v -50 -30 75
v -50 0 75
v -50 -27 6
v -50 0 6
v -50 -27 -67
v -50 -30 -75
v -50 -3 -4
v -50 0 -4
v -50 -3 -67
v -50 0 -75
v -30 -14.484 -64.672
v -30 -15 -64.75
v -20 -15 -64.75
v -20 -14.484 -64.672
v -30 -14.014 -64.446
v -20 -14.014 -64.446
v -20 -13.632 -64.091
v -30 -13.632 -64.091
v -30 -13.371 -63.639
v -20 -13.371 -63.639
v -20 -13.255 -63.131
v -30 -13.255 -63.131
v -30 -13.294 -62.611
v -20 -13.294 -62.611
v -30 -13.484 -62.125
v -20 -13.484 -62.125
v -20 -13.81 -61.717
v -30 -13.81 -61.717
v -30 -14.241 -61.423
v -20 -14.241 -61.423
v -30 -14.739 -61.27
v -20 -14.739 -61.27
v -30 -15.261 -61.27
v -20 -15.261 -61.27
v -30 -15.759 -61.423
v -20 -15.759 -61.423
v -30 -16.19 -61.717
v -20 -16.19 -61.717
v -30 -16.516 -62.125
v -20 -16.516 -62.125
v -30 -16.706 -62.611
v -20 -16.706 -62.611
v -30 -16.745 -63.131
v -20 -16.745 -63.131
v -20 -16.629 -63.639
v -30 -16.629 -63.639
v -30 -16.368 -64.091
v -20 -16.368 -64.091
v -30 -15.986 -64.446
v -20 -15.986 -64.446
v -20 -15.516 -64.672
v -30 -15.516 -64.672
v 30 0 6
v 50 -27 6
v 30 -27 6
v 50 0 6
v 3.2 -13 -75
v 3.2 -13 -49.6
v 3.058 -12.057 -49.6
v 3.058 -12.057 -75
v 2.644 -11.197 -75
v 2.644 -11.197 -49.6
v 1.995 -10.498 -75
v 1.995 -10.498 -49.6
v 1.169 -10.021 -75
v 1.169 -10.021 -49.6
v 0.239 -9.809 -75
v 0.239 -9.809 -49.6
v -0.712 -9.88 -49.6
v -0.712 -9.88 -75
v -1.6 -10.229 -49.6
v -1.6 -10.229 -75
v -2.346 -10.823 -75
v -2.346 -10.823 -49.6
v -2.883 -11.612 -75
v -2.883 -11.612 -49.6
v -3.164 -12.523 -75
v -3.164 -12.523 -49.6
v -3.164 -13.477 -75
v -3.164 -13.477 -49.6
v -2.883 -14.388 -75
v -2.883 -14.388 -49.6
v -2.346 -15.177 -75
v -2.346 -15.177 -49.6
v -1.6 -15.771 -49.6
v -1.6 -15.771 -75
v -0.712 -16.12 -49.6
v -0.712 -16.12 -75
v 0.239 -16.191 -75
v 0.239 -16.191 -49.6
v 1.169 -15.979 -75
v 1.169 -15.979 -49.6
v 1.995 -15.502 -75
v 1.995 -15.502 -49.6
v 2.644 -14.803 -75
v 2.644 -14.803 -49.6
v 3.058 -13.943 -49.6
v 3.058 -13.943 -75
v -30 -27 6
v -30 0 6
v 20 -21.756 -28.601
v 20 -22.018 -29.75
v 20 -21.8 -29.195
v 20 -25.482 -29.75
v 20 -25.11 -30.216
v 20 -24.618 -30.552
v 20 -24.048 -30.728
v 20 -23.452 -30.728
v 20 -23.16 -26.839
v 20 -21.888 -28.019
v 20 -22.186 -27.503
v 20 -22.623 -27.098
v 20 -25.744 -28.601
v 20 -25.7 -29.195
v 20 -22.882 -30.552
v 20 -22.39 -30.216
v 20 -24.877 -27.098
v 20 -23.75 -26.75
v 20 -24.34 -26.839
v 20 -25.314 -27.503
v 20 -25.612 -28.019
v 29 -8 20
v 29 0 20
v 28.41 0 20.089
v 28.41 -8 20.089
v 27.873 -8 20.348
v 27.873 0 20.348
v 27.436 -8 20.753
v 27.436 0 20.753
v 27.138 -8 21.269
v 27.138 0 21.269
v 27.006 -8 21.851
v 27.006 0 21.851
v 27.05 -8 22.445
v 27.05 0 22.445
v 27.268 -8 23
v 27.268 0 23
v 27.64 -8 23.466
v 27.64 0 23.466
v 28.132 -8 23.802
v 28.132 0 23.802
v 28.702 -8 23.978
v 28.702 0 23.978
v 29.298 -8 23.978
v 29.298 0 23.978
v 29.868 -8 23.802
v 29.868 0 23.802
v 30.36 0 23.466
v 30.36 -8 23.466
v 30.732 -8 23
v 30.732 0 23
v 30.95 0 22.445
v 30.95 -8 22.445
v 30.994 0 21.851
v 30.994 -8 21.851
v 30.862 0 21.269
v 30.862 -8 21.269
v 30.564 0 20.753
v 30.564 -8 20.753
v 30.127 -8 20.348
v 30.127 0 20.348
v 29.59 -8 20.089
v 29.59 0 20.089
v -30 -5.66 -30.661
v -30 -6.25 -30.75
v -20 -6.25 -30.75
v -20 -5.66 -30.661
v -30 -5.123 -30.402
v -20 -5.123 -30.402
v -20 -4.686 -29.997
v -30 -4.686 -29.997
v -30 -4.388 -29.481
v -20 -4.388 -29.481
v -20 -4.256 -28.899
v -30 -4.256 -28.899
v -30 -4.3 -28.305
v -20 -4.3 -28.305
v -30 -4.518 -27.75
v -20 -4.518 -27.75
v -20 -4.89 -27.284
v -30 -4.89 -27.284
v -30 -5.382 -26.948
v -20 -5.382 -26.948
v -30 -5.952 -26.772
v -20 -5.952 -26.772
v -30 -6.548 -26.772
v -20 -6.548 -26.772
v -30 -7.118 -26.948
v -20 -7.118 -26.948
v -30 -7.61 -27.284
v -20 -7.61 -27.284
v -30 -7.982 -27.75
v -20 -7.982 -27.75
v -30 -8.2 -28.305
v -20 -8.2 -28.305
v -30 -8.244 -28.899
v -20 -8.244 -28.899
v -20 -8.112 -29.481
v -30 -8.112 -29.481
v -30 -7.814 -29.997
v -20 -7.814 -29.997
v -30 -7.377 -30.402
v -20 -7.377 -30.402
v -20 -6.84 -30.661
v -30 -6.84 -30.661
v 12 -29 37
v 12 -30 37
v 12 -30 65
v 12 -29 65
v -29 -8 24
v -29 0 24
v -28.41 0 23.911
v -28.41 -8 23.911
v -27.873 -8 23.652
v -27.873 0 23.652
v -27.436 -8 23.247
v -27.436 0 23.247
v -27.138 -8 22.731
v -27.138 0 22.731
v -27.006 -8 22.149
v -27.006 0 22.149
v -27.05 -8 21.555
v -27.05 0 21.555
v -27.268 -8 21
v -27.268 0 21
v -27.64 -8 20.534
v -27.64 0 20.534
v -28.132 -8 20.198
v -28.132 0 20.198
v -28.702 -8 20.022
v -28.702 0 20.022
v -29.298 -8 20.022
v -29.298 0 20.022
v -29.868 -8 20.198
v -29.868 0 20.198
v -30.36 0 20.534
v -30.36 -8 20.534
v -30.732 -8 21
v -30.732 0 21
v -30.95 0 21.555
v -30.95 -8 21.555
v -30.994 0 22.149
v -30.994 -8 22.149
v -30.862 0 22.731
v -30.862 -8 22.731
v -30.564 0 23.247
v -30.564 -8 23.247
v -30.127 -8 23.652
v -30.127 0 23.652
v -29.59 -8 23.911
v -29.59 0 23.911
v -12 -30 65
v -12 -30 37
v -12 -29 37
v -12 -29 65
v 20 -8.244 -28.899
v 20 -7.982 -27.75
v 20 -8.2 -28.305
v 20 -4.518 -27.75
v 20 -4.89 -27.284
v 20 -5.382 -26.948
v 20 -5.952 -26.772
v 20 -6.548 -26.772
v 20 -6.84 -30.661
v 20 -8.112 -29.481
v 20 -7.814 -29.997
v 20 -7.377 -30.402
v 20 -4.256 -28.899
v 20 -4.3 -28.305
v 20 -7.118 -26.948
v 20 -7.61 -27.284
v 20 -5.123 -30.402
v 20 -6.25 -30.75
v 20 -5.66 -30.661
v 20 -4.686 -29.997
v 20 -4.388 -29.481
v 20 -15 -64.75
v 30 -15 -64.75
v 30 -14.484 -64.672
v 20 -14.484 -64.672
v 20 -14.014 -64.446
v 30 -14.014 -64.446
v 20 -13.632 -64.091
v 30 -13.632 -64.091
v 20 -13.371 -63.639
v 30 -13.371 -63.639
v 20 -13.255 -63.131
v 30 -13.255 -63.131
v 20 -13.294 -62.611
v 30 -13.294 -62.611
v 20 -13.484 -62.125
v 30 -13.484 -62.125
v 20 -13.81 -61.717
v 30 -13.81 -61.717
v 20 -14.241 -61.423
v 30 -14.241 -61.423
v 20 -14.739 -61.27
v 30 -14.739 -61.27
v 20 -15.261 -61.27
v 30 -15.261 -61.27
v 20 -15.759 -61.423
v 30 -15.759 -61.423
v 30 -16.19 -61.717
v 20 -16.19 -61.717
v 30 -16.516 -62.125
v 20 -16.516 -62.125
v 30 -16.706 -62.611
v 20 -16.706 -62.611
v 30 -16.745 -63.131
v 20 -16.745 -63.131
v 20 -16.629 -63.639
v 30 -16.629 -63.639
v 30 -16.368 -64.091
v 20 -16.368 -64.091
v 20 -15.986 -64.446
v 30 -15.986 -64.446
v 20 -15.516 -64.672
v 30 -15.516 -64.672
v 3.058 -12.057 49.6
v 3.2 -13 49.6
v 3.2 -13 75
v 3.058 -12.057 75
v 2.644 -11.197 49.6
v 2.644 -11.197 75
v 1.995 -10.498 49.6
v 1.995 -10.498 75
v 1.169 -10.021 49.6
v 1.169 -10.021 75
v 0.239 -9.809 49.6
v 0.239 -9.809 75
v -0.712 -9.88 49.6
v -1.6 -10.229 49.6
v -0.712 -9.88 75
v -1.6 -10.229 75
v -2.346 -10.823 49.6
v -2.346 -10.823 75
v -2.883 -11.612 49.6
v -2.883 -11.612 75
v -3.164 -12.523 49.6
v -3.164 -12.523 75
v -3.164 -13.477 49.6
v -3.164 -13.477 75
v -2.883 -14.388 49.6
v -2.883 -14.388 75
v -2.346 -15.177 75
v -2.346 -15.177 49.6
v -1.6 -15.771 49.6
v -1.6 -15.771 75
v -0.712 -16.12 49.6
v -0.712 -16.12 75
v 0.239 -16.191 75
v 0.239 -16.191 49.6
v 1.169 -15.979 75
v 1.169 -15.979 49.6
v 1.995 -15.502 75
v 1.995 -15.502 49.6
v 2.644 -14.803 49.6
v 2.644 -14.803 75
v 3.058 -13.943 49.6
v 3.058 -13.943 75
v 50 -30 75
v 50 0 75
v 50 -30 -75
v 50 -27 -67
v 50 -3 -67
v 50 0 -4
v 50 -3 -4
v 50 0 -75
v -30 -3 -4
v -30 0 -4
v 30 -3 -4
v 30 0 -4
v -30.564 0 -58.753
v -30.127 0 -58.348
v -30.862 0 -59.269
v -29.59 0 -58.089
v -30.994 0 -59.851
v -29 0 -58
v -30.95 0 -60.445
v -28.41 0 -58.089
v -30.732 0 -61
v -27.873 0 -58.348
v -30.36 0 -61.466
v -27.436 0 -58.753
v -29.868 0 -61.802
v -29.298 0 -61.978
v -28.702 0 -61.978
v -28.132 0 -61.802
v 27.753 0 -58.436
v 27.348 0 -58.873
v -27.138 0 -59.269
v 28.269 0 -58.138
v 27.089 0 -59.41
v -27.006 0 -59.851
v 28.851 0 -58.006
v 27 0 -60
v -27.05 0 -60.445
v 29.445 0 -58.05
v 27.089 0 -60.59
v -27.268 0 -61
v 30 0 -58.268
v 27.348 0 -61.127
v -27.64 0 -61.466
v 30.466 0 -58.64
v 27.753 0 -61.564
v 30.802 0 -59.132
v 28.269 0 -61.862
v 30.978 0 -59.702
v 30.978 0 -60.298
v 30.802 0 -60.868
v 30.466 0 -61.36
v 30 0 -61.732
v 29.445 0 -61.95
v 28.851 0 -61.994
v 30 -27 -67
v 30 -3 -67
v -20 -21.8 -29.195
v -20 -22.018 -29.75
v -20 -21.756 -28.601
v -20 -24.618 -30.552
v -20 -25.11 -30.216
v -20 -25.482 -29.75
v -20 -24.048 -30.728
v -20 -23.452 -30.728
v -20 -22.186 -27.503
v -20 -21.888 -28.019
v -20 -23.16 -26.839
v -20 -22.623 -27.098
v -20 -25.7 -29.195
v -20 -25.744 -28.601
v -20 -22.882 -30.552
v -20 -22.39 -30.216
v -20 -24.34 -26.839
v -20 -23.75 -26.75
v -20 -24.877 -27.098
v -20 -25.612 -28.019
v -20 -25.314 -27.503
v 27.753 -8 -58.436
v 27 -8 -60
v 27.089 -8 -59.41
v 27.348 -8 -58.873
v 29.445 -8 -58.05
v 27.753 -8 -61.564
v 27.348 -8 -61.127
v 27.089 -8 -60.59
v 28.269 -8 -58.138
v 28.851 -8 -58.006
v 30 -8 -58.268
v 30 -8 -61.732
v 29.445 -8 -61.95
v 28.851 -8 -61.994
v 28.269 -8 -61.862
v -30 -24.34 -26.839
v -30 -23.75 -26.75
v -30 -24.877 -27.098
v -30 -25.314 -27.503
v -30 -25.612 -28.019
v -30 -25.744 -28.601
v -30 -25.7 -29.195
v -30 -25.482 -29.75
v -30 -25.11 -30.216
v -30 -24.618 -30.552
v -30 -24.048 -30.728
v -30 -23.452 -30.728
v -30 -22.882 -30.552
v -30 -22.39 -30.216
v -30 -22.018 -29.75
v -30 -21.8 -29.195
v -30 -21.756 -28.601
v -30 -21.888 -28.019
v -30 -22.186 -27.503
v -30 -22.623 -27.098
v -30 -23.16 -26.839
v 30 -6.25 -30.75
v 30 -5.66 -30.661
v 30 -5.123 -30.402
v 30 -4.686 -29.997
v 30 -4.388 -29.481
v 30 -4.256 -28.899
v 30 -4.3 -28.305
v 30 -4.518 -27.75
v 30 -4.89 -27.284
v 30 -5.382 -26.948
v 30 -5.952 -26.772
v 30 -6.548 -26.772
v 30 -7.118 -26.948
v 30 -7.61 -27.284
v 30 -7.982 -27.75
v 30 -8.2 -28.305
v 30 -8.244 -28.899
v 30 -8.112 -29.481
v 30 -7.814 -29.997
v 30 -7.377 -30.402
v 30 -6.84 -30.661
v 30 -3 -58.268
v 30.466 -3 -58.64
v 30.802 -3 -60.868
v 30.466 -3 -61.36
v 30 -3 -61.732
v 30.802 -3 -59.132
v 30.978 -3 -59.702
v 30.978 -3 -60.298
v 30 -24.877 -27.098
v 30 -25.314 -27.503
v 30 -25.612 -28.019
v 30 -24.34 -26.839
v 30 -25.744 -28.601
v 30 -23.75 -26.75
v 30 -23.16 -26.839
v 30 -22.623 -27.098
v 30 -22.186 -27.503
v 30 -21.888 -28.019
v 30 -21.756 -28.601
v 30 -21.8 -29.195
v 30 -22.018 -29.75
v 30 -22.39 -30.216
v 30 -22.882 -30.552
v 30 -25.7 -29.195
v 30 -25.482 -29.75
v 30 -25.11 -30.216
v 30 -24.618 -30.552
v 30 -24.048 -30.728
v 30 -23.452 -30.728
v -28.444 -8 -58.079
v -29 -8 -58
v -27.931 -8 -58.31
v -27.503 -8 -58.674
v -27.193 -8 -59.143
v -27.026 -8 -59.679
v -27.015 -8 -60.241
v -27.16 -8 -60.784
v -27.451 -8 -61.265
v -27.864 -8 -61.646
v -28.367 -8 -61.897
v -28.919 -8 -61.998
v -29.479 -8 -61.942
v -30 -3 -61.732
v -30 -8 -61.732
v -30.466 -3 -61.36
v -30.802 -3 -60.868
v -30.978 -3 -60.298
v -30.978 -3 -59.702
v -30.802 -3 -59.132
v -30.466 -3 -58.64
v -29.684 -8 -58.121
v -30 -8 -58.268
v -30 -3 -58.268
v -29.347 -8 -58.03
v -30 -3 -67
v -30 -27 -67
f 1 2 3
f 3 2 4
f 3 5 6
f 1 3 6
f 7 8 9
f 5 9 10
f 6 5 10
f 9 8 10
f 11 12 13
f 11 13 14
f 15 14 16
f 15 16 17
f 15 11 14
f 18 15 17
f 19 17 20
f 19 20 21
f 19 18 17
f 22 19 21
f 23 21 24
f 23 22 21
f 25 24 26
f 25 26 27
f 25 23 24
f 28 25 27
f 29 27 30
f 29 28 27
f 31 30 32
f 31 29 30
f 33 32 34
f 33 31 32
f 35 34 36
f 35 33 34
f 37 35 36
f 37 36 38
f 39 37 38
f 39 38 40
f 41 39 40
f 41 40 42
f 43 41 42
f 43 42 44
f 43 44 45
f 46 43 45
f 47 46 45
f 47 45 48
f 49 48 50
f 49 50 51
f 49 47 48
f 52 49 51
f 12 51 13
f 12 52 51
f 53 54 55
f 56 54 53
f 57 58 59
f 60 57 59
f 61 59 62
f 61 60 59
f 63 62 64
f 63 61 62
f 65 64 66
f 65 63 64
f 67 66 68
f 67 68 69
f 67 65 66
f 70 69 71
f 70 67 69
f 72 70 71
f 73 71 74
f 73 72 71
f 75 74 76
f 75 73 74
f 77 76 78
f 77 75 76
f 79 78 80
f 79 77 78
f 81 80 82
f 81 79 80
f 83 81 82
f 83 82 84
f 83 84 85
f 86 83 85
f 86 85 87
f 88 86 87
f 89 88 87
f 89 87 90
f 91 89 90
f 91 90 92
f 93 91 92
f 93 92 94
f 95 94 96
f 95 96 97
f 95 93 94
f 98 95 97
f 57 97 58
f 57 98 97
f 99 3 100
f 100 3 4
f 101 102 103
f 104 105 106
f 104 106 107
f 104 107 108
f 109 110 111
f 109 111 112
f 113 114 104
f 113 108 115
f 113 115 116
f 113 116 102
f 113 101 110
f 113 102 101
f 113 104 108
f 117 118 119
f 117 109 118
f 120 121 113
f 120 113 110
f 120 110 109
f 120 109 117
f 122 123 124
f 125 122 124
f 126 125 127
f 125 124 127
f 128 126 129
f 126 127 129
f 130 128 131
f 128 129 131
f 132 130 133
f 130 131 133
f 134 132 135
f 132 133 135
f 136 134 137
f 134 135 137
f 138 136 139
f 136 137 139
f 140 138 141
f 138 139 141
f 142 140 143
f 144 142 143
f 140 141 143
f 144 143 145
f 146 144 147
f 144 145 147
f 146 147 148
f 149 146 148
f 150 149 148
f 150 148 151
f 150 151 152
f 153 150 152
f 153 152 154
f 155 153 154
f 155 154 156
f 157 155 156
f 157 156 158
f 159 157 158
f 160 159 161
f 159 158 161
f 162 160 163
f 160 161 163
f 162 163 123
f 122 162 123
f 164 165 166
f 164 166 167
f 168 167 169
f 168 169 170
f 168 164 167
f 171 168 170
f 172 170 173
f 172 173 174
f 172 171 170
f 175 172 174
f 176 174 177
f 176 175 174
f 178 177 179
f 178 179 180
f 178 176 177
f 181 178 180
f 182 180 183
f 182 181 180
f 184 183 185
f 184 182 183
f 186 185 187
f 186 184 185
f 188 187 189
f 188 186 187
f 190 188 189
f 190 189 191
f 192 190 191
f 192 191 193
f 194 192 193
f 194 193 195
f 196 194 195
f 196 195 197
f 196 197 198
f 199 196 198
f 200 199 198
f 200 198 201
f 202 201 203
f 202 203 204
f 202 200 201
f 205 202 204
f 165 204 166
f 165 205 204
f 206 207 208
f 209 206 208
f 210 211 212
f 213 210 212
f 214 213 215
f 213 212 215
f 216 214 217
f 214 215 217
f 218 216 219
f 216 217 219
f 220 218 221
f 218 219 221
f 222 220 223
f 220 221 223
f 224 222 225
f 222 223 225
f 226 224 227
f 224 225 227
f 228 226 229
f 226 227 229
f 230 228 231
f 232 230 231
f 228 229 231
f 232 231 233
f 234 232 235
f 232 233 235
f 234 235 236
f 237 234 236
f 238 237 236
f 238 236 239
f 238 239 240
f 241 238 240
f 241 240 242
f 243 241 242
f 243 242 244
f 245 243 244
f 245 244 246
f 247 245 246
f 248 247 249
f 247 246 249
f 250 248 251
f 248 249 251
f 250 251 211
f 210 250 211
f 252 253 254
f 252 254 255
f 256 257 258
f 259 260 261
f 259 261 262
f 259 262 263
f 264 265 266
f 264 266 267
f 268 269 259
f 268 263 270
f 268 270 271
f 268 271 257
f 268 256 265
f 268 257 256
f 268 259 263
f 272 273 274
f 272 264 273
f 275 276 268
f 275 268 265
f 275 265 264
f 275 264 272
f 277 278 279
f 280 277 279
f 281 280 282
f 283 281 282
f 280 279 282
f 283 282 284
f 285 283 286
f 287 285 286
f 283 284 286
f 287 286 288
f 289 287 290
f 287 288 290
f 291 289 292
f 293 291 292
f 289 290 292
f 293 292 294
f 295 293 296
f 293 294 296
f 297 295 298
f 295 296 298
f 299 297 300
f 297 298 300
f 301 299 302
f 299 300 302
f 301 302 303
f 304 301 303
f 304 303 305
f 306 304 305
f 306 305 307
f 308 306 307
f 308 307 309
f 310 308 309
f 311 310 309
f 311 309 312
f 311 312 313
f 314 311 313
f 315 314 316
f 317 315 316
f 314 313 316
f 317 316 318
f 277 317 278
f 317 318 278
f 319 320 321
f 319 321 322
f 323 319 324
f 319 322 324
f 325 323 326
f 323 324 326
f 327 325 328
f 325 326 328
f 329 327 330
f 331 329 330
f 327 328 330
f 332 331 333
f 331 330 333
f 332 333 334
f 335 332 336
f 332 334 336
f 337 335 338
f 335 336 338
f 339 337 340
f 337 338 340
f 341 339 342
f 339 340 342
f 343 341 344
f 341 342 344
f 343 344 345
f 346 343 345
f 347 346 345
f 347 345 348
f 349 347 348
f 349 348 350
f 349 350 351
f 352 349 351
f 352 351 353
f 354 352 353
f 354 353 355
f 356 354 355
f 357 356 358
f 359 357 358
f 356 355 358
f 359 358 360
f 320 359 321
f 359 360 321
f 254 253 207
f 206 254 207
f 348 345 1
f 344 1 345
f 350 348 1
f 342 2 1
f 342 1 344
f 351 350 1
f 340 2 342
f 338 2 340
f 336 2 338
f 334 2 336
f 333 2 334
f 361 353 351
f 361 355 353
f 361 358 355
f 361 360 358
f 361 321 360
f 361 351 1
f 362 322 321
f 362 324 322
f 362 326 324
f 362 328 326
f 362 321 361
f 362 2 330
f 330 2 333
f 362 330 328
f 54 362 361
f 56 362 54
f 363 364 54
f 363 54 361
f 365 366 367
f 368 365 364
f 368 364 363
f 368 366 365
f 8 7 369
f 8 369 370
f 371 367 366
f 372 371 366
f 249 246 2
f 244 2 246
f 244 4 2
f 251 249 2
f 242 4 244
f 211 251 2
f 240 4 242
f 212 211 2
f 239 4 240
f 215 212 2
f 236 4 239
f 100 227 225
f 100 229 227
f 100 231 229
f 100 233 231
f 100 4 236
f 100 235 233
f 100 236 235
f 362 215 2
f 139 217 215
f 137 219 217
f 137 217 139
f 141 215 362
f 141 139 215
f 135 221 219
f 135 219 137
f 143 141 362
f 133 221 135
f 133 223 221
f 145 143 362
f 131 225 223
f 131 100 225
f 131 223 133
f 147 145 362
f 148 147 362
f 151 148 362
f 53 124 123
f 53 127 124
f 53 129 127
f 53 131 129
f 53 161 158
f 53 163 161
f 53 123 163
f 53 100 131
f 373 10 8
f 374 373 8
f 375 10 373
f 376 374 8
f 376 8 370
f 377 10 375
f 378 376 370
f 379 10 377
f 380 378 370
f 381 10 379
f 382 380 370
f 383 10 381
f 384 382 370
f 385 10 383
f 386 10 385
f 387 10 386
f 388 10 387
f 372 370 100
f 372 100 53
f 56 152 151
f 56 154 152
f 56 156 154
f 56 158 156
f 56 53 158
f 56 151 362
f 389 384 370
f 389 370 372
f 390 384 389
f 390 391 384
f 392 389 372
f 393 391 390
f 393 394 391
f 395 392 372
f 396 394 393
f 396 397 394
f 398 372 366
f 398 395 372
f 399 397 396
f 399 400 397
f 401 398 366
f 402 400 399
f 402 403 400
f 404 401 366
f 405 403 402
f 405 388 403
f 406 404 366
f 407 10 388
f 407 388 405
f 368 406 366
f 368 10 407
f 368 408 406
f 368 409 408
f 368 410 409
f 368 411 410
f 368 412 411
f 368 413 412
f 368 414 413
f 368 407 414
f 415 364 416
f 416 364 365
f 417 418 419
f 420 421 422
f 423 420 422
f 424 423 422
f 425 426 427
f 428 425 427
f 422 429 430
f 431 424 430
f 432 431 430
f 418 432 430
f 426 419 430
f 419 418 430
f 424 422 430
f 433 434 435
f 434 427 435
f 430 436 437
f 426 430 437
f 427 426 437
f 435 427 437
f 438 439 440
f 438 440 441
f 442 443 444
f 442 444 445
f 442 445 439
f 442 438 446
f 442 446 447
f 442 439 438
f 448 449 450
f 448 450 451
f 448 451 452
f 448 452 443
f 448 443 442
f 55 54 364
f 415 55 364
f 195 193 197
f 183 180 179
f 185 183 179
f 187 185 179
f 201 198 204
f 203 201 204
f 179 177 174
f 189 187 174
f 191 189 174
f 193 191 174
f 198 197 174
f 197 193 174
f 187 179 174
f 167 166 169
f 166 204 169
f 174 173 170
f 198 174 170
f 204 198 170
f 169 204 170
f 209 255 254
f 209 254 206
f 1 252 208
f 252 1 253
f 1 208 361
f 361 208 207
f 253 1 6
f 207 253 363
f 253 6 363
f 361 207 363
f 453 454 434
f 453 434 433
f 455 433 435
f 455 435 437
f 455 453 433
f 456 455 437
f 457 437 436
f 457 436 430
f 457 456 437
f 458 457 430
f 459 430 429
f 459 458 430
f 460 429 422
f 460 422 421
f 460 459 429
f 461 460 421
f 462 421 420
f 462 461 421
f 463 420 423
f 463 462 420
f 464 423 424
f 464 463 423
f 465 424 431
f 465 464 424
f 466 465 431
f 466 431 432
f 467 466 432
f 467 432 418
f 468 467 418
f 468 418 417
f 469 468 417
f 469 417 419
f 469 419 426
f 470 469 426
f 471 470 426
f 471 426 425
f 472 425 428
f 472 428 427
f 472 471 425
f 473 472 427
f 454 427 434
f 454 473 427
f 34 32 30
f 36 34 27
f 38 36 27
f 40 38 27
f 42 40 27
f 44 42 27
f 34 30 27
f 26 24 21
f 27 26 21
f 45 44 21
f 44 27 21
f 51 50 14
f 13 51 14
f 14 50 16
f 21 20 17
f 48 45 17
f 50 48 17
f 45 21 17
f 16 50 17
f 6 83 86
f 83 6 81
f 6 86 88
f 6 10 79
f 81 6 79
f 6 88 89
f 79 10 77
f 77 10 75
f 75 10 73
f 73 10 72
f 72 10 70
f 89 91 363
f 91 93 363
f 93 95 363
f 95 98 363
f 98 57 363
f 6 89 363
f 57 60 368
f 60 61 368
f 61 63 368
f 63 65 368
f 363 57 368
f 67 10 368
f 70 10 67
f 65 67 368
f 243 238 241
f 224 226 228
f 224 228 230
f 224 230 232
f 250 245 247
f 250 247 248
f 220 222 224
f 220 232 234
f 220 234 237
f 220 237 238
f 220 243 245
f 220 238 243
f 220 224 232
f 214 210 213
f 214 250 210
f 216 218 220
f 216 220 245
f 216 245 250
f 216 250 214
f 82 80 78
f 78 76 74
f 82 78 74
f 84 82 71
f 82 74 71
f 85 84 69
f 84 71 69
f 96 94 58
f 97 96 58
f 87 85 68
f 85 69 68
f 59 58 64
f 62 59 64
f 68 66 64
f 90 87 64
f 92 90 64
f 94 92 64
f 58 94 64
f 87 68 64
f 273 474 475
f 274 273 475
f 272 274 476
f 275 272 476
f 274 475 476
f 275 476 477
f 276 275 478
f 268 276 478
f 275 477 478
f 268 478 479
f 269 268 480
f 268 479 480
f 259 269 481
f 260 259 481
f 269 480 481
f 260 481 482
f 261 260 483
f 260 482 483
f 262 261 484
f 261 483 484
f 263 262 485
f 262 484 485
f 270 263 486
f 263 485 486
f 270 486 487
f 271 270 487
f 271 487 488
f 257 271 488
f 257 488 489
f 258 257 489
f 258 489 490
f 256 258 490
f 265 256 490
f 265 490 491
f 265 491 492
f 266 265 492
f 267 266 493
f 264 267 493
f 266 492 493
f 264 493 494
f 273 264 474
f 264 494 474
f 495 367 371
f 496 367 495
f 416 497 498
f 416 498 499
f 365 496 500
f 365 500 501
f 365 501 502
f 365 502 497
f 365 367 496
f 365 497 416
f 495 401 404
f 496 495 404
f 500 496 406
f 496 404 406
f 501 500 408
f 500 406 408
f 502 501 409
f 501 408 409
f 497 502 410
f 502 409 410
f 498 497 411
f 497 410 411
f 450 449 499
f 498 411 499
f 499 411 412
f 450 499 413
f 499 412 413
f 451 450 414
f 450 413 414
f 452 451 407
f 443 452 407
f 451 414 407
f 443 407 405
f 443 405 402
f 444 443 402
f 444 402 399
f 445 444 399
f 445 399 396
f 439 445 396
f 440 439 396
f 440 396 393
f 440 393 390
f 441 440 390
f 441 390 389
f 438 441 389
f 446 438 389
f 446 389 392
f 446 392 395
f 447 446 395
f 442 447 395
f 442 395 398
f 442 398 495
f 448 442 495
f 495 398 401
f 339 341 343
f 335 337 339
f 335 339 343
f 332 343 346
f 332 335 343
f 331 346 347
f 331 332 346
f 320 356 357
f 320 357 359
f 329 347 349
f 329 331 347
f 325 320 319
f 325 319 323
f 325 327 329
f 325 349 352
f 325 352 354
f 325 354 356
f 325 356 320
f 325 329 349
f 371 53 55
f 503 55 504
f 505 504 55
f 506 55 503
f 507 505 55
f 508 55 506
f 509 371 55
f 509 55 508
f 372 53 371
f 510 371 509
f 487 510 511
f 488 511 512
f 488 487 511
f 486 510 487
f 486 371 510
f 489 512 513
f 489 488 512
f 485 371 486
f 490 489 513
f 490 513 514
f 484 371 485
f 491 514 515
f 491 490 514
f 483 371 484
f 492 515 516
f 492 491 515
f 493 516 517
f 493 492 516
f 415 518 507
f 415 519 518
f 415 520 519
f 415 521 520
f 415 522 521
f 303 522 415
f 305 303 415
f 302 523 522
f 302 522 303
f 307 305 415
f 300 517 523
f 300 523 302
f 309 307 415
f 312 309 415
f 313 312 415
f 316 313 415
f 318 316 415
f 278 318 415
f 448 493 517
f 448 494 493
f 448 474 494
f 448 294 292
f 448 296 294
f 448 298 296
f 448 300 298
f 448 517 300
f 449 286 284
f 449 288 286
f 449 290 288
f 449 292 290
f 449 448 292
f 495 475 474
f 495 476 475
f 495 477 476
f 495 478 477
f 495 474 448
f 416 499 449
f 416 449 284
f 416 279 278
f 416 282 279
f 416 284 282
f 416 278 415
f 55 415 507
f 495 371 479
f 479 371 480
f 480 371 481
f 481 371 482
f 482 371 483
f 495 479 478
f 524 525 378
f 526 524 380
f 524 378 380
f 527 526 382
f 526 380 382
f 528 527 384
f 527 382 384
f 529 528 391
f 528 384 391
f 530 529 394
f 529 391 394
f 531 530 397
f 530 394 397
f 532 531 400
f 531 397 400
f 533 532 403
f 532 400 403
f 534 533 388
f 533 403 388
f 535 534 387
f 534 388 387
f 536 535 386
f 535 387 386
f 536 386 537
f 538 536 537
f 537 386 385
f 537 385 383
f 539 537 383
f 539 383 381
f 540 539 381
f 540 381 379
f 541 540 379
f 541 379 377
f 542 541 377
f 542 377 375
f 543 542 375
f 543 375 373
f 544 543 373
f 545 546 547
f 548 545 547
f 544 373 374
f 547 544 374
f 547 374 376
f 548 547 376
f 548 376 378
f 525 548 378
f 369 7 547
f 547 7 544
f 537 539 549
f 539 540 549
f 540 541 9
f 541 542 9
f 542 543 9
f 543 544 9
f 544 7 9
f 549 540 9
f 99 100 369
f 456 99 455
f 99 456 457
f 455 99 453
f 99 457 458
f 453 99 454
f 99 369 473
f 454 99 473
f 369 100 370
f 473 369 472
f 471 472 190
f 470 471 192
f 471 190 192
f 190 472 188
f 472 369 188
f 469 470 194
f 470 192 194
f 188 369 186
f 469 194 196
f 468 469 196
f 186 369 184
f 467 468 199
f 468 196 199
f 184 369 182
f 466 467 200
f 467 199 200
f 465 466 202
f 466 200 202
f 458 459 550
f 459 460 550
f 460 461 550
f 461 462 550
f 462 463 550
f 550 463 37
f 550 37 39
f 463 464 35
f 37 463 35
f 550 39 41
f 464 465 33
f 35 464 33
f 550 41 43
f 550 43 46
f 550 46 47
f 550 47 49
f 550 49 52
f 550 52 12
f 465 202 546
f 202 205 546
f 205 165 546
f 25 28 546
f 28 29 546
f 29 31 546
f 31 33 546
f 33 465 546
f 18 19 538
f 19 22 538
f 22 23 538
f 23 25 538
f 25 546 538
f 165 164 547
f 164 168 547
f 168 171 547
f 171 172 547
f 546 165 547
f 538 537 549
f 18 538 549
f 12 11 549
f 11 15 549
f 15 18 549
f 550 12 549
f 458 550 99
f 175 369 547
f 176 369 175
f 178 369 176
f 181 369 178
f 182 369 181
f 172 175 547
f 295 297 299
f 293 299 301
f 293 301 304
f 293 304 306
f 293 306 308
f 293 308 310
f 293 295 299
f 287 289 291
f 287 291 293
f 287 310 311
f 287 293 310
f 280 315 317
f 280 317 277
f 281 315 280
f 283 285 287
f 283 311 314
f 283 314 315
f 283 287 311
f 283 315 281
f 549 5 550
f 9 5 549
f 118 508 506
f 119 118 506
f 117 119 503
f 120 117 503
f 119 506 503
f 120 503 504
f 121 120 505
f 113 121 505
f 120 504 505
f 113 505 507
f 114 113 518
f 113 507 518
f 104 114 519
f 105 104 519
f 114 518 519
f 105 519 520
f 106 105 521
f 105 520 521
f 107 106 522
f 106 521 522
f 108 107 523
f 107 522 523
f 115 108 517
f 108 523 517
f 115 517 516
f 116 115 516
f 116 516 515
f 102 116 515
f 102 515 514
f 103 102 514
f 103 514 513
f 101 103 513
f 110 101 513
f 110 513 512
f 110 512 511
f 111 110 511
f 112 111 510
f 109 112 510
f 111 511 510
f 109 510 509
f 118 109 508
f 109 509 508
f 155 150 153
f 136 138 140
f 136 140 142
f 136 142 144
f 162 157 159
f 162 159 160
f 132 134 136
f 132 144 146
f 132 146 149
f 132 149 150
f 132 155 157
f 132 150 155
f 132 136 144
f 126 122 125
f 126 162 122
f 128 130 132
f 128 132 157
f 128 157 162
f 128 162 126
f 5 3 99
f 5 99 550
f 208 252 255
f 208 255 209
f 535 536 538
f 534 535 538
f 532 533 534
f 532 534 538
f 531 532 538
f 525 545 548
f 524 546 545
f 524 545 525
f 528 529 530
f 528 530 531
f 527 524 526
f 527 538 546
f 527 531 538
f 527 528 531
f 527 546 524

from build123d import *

# Parameters (mm, degrees)
SKETCH1_W                    = 100
SKETCH1_H                    = 150
BOX_DEPTH                    = 30
SKETCH2_W                    = 73
SKETCH2_H                    = 24
MOTOR_COMPARTMENT_DEPTH      = 20
SKETCH3_W                    = 10
SKETCH3_H                    = 3
MOTOR_WIRE_PASSTHROUGH_DEPTH = 20
SKETCH4_R                    = 1.75
SKETCH4_R_2                  = 2
MOTOR_SCREW_MOUNT_DEPTH      = 10
SKETCH5_R                    = 2
MAKER_PI_MOUNT_HOLES_DEPTH   = 8
SKETCH6_W                    = 24
SKETCH6_H                    = 28
CASTER_MOUNT_DEPTH           = 1
SKETCH7_R                    = 3.2
FRONT_MOUNT_HOLE_DEPTH       = 25.4


with BuildPart() as part:
    # Sketch1 → box (new body)
    with BuildSketch(Plane(origin=(0, 0, 0), x_dir=(1, 0, 0), z_dir=(0, 1, 0))):
        Rectangle(SKETCH1_W, SKETCH1_H)
    extrude(amount=-BOX_DEPTH)

    # Sketch2 → motor compartment (cut)
    with BuildSketch(Plane(origin=(50, 0, 0), x_dir=(0, 0, -1), z_dir=(1, 0, 0))):
        with Locations((30.5, -15)):
            Rectangle(SKETCH2_W, SKETCH2_H)
    motor_compartment = extrude(amount=-MOTOR_COMPARTMENT_DEPTH, mode=Mode.SUBTRACT)

    # Sketch3 → motor wire passthrough (cut)
    with BuildSketch(Plane(origin=(50, 0, 0), x_dir=(0, 0, -1), z_dir=(1, 0, 0))):
        with Locations((-1, -1.5)):
            Rectangle(SKETCH3_W, SKETCH3_H)
    motor_wire_passthrough = extrude(amount=-MOTOR_WIRE_PASSTHROUGH_DEPTH, mode=Mode.SUBTRACT)

    # Sketch4 → motor screw mount (cut)
    with BuildSketch(Plane(origin=(30, 0, 0), x_dir=(0, 0, -1), z_dir=(1, 0, 0))):
        with Locations((63, -15)):
            Circle(SKETCH4_R)
        with Locations((28.75, -6.25)):
            Circle(SKETCH4_R_2)
        with Locations(Location((28.75, -23.75, 0), (0, 0, 180))):
            Circle(SKETCH4_R_2)
    motor_screw_mount = extrude(amount=-MOTOR_SCREW_MOUNT_DEPTH, mode=Mode.SUBTRACT)

    # motor compartment mirror: motor compartment, motor wire passthrough, motor screw mount across plane
    add(motor_compartment.mirror(Plane(origin=(0, 0, 0), x_dir=(0, 0, 1), z_dir=(1, 0, 0))), mode=Mode.SUBTRACT)
    add(motor_wire_passthrough.mirror(Plane(origin=(0, 0, 0), x_dir=(0, 0, 1), z_dir=(1, 0, 0))), mode=Mode.SUBTRACT)
    add(motor_screw_mount.mirror(Plane(origin=(0, 0, 0), x_dir=(0, 0, 1), z_dir=(1, 0, 0))), mode=Mode.SUBTRACT)

    # Sketch5 → Maker Pi mount holes (cut)
    with BuildSketch(Plane(origin=(0, 0, 0), x_dir=(1, 0, 0), z_dir=(0, 1, 0))):
        with Locations(Location((-29, 60, 0), (0, 0, 270))):
            Circle(SKETCH5_R)
        with Locations(Location((-29, -22, 0), (0, 0, 270))):
            Circle(SKETCH5_R)
        with Locations(Location((29, 60, 0), (0, 0, 300))):
            Circle(SKETCH5_R)
        with Locations(Location((29, -22, 0), (0, 0, 90))):
            Circle(SKETCH5_R)
    extrude(amount=-MAKER_PI_MOUNT_HOLES_DEPTH, mode=Mode.SUBTRACT)

    # Sketch6 → caster mount (cut)
    with BuildSketch(Plane.XZ.offset(30)):
        with Locations((0, 51)):
            Rectangle(SKETCH6_W, SKETCH6_H)
    extrude(amount=-CASTER_MOUNT_DEPTH, mode=Mode.SUBTRACT)

    # Sketch7 → front mount hole (cut)
    with BuildSketch(Plane.XY.offset(75)):
        with Locations((0, -13)):
            Circle(SKETCH7_R)
    front_mount_hole = extrude(amount=-FRONT_MOUNT_HOLE_DEPTH, mode=Mode.SUBTRACT)

    # back mount hole: front mount hole across plane
    add(front_mount_hole.mirror(Plane.XY), mode=Mode.SUBTRACT)


solid = part.part
